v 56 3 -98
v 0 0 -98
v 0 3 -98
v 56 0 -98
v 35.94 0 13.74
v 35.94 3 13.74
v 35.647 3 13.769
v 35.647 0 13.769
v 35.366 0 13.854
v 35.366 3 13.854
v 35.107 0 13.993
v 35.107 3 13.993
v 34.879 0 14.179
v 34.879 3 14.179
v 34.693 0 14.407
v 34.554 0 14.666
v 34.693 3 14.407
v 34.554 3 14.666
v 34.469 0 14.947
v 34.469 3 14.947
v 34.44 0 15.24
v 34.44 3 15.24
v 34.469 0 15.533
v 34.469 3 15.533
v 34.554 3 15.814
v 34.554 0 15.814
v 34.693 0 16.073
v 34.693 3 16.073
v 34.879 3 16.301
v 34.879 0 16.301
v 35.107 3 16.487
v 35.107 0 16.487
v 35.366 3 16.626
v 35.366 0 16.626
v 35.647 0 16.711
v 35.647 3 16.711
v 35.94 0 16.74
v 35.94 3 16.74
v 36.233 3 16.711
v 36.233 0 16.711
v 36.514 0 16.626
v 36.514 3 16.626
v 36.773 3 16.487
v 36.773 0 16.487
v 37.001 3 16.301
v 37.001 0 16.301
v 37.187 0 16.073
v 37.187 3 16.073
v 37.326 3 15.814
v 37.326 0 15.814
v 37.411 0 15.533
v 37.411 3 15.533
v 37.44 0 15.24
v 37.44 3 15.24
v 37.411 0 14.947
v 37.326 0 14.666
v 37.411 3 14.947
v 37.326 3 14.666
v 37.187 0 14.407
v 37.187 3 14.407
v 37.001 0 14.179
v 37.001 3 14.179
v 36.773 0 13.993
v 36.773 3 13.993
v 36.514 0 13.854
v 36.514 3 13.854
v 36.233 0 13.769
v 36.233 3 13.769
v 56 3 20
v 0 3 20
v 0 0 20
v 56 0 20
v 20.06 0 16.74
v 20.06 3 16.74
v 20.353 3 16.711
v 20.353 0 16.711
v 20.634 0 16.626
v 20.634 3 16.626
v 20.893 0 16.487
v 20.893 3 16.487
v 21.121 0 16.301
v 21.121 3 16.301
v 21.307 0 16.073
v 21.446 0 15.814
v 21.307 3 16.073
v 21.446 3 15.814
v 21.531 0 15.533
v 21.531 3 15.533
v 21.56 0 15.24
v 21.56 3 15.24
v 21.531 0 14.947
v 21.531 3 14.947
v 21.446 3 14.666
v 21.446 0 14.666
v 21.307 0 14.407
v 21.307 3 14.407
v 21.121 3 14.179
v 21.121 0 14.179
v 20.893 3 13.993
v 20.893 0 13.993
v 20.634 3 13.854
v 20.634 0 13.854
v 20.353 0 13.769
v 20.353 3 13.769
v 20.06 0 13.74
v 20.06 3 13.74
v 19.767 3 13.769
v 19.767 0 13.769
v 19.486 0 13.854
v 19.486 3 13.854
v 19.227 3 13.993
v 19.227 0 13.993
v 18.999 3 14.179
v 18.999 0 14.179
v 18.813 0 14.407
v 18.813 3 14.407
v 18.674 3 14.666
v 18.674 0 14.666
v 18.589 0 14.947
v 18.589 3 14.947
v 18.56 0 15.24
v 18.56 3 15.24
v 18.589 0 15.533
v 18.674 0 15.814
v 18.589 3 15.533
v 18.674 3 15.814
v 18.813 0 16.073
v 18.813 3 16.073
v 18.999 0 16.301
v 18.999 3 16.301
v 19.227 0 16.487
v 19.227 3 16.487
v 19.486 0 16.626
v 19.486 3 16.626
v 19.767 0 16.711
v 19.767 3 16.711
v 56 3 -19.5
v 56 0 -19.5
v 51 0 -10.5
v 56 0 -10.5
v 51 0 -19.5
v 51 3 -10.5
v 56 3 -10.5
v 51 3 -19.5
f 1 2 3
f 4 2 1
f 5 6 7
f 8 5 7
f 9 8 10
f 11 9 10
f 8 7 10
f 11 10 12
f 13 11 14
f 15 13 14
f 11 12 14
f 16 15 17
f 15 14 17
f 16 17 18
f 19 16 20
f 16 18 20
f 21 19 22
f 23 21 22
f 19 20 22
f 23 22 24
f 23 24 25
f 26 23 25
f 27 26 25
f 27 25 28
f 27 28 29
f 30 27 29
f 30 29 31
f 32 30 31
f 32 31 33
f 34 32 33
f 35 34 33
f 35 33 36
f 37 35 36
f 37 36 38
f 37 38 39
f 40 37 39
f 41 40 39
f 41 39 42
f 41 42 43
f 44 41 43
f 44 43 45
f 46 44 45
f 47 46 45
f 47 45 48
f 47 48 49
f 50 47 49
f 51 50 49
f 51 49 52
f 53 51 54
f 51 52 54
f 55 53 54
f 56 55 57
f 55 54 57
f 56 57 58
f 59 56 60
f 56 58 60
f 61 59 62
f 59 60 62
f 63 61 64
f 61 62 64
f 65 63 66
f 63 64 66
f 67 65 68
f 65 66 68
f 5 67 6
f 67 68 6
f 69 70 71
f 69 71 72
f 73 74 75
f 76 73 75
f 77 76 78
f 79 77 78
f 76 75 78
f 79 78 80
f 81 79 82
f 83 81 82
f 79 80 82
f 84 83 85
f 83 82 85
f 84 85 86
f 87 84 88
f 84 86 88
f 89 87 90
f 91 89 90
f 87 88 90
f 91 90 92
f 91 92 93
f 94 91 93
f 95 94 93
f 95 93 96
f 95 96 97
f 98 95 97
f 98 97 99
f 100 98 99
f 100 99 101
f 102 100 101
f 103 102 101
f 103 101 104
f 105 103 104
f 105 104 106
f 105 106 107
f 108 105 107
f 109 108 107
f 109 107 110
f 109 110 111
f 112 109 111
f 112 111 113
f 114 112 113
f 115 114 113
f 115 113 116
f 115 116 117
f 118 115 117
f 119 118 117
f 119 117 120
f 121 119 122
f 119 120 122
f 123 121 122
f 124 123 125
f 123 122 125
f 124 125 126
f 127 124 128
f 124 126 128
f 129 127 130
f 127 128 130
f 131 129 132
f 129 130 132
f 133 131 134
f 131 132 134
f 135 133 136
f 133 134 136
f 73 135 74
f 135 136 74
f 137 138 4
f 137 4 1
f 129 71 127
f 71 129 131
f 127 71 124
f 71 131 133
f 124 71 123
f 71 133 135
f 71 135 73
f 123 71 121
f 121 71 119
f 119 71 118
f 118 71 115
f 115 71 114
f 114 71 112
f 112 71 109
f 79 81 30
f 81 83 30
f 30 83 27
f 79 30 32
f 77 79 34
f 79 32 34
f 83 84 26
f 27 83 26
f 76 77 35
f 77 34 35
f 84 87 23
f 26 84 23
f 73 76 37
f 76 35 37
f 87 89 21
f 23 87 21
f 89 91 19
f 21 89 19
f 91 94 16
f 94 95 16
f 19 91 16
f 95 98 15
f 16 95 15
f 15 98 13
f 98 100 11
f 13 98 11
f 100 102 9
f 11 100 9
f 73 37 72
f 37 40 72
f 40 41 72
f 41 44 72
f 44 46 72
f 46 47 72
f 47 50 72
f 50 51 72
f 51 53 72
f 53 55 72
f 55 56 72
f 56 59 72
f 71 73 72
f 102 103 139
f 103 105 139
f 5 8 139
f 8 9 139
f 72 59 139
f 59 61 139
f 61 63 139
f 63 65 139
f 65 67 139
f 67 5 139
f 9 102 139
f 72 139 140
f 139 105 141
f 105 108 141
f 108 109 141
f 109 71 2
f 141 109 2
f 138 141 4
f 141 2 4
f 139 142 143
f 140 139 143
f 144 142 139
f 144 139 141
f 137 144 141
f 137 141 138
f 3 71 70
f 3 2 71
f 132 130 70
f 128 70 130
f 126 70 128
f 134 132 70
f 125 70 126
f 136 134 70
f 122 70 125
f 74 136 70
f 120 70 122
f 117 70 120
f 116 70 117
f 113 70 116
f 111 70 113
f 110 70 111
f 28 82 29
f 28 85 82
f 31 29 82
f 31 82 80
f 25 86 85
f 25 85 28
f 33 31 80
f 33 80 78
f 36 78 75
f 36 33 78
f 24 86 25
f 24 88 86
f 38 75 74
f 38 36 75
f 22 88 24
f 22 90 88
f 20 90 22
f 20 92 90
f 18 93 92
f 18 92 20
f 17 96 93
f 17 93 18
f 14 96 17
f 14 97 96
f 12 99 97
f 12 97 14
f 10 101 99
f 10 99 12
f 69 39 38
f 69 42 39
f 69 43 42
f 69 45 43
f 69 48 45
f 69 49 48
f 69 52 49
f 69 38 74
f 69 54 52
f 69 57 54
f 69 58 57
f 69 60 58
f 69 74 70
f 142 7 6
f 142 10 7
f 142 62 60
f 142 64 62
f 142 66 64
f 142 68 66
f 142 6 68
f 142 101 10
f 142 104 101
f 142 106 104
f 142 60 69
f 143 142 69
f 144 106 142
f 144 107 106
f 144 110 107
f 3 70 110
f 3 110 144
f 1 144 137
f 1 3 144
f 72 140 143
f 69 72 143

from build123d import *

# Parameters (mm, degrees)
SKETCH1_W             = 56
SKETCH1_H             = 98
BOSS_EXTRUDE1_DEPTH   = 3
SKETCH4_W             = 56
SKETCH4_H             = 3
BOSS_EXTRUDE3_DEPTH   = 20
SKETCH9_W             = 5
SKETCH9_H             = 9
CUT_EXTRUDE1_DEPTH    = 10
CROQUIS1_R            = 1.5
CORTAR_EXTRUIR1_DEPTH = 10


with BuildPart() as part:
    # Sketch1 → Boss-Extrude1 (new body)
    with BuildSketch(Plane(origin=(0, 0, 0), x_dir=(1, 0, 0), z_dir=(0, 1, 0))):
        with Locations((28, 49)):
            Rectangle(SKETCH1_W, SKETCH1_H)
    extrude(amount=BOSS_EXTRUDE1_DEPTH)

    # Sketch4 → Boss-Extrude3 (add)
    with BuildSketch(Plane.XY):
        with Locations((28, 1.5)):
            Rectangle(SKETCH4_W, SKETCH4_H)
    extrude(amount=BOSS_EXTRUDE3_DEPTH)

    # Sketch9 → Cut-Extrude1 (cut)
    with BuildSketch(Plane(origin=(0, 3, 0), x_dir=(1, 0, 0), z_dir=(0, 1, 0))):
        with Locations((53.5, 15)):
            Rectangle(SKETCH9_W, SKETCH9_H)
    extrude(amount=-CUT_EXTRUDE1_DEPTH, mode=Mode.SUBTRACT)

    # Croquis1 → Cortar-Extruir1 (cut)
    with BuildSketch(Plane(origin=(0, 3, 0), x_dir=(1, 0, 0), z_dir=(0, 1, 0))):
        with Locations(Location((20.06, -15.24, 0), (0, 0, 270))):
            Circle(CROQUIS1_R)
        with Locations(Location((35.94, -15.24, 0), (0, 0, 90))):
            Circle(CROQUIS1_R)
    extrude(amount=-CORTAR_EXTRUIR1_DEPTH, mode=Mode.SUBTRACT)


solid = part.part
